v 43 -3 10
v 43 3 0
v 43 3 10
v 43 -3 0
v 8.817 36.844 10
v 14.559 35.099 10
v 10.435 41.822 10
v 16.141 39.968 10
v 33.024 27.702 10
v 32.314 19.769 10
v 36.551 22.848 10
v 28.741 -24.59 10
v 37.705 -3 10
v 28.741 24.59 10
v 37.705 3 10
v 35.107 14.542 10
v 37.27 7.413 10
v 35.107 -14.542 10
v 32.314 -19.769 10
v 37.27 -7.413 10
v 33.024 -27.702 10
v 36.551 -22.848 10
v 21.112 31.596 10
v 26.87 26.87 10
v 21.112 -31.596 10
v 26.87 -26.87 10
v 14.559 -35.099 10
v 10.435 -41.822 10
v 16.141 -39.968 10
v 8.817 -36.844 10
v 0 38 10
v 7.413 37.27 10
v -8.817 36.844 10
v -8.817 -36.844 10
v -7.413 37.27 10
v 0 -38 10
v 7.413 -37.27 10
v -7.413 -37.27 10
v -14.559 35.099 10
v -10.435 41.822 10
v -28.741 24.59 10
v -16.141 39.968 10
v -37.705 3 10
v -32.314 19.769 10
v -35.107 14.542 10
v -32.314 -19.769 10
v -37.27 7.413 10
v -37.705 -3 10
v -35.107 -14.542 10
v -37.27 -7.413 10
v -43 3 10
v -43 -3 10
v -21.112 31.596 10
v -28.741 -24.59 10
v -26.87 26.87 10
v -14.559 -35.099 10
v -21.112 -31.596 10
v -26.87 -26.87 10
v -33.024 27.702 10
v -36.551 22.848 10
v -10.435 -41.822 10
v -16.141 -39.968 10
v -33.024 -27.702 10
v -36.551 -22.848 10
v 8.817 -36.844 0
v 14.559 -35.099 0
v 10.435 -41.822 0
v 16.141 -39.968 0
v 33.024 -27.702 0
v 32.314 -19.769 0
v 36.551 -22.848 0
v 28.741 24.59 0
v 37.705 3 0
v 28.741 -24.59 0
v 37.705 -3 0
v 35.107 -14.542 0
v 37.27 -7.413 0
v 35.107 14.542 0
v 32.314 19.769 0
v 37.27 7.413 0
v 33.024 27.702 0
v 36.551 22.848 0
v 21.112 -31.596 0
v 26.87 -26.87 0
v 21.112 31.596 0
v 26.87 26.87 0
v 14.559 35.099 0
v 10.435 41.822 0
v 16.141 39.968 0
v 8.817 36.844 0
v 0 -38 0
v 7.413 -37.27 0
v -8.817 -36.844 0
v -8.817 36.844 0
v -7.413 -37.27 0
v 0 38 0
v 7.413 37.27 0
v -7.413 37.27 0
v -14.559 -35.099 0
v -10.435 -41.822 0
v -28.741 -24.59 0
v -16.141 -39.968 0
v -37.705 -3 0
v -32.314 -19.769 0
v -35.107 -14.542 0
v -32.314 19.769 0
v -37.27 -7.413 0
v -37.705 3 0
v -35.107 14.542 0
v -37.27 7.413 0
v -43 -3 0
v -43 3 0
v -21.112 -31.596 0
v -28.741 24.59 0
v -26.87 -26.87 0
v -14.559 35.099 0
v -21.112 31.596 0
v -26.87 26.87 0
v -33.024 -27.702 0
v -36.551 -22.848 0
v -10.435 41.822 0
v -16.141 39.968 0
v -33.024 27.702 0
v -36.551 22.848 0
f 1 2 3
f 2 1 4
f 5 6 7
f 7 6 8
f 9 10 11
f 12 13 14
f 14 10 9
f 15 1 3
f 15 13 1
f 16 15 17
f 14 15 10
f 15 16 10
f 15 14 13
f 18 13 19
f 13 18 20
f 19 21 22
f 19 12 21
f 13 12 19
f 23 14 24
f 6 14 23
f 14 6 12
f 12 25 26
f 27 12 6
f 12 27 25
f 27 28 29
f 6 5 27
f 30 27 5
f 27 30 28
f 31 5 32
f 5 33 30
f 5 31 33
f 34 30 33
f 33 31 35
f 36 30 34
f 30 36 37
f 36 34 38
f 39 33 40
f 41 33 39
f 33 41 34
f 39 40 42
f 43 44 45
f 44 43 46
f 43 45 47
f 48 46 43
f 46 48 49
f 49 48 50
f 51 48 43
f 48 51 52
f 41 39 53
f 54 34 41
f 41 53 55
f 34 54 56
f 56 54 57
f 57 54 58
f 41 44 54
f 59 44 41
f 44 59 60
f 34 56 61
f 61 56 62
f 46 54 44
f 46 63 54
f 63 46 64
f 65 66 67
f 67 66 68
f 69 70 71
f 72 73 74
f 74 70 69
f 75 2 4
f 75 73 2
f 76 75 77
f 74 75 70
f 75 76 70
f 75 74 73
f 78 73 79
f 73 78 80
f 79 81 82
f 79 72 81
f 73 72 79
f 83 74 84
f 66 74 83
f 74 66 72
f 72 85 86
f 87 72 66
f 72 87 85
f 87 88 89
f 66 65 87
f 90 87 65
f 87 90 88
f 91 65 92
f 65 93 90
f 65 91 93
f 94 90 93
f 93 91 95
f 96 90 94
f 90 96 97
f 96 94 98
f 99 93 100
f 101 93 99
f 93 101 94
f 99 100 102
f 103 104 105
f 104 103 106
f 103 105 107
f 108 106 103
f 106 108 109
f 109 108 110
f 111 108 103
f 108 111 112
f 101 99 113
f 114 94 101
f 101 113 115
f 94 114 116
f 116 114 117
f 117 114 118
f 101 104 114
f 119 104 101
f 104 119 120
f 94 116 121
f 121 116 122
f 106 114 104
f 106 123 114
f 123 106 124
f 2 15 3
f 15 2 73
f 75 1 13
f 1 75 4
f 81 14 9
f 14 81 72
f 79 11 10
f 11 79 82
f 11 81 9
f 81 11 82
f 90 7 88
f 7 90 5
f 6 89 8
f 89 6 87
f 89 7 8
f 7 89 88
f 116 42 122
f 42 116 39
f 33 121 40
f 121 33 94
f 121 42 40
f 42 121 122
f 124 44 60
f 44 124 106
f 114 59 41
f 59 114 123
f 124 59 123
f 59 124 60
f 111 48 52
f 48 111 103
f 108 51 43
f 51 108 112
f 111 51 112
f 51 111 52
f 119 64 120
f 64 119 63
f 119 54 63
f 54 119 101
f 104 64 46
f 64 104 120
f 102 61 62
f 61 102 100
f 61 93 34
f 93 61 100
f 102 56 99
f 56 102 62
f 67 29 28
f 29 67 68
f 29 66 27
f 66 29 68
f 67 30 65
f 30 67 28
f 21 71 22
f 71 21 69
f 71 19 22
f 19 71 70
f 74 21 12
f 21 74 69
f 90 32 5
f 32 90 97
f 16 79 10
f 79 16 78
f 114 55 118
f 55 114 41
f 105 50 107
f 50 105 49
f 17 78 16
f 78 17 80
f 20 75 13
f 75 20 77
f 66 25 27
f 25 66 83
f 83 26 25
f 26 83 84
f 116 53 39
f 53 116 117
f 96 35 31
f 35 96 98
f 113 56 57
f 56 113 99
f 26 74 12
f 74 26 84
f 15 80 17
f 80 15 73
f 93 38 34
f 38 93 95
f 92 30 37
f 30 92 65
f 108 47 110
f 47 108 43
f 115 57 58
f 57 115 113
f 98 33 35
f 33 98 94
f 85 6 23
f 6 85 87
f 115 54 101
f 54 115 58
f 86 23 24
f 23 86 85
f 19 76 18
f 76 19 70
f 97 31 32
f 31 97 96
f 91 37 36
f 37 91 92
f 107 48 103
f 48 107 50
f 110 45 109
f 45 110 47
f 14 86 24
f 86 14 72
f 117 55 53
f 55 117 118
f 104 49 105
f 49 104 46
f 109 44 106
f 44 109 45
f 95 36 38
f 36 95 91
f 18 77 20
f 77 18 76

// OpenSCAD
$fn = 32;

// ----------------------------------------------------------------------
// Spur blank: plain gear blank
// ----------------------------------------------------------------------

// --- parameters (mm) ---
disc_r = 38;              // blank root radius
disc_t = 10;              // blank thickness
n_teeth = 10;             // stub tooth count
tooth_w = 6;              // tooth width at the root
tooth_h = 5;              // tooth height above the root

out_r = disc_r + tooth_h;  // tip radius
bbox_x = 86.0;  // measured width over the teeth
bbox_y = 83.64;  // measured depth over the teeth

union() {
  cylinder(r = disc_r, h = disc_t);
  for (i = [0 : n_teeth - 1])
    rotate([0, 0, i * 360 / n_teeth])
      translate([disc_r - 1, -tooth_w / 2, 0])
        cube([tooth_h + 1, tooth_w, disc_t]);
}
